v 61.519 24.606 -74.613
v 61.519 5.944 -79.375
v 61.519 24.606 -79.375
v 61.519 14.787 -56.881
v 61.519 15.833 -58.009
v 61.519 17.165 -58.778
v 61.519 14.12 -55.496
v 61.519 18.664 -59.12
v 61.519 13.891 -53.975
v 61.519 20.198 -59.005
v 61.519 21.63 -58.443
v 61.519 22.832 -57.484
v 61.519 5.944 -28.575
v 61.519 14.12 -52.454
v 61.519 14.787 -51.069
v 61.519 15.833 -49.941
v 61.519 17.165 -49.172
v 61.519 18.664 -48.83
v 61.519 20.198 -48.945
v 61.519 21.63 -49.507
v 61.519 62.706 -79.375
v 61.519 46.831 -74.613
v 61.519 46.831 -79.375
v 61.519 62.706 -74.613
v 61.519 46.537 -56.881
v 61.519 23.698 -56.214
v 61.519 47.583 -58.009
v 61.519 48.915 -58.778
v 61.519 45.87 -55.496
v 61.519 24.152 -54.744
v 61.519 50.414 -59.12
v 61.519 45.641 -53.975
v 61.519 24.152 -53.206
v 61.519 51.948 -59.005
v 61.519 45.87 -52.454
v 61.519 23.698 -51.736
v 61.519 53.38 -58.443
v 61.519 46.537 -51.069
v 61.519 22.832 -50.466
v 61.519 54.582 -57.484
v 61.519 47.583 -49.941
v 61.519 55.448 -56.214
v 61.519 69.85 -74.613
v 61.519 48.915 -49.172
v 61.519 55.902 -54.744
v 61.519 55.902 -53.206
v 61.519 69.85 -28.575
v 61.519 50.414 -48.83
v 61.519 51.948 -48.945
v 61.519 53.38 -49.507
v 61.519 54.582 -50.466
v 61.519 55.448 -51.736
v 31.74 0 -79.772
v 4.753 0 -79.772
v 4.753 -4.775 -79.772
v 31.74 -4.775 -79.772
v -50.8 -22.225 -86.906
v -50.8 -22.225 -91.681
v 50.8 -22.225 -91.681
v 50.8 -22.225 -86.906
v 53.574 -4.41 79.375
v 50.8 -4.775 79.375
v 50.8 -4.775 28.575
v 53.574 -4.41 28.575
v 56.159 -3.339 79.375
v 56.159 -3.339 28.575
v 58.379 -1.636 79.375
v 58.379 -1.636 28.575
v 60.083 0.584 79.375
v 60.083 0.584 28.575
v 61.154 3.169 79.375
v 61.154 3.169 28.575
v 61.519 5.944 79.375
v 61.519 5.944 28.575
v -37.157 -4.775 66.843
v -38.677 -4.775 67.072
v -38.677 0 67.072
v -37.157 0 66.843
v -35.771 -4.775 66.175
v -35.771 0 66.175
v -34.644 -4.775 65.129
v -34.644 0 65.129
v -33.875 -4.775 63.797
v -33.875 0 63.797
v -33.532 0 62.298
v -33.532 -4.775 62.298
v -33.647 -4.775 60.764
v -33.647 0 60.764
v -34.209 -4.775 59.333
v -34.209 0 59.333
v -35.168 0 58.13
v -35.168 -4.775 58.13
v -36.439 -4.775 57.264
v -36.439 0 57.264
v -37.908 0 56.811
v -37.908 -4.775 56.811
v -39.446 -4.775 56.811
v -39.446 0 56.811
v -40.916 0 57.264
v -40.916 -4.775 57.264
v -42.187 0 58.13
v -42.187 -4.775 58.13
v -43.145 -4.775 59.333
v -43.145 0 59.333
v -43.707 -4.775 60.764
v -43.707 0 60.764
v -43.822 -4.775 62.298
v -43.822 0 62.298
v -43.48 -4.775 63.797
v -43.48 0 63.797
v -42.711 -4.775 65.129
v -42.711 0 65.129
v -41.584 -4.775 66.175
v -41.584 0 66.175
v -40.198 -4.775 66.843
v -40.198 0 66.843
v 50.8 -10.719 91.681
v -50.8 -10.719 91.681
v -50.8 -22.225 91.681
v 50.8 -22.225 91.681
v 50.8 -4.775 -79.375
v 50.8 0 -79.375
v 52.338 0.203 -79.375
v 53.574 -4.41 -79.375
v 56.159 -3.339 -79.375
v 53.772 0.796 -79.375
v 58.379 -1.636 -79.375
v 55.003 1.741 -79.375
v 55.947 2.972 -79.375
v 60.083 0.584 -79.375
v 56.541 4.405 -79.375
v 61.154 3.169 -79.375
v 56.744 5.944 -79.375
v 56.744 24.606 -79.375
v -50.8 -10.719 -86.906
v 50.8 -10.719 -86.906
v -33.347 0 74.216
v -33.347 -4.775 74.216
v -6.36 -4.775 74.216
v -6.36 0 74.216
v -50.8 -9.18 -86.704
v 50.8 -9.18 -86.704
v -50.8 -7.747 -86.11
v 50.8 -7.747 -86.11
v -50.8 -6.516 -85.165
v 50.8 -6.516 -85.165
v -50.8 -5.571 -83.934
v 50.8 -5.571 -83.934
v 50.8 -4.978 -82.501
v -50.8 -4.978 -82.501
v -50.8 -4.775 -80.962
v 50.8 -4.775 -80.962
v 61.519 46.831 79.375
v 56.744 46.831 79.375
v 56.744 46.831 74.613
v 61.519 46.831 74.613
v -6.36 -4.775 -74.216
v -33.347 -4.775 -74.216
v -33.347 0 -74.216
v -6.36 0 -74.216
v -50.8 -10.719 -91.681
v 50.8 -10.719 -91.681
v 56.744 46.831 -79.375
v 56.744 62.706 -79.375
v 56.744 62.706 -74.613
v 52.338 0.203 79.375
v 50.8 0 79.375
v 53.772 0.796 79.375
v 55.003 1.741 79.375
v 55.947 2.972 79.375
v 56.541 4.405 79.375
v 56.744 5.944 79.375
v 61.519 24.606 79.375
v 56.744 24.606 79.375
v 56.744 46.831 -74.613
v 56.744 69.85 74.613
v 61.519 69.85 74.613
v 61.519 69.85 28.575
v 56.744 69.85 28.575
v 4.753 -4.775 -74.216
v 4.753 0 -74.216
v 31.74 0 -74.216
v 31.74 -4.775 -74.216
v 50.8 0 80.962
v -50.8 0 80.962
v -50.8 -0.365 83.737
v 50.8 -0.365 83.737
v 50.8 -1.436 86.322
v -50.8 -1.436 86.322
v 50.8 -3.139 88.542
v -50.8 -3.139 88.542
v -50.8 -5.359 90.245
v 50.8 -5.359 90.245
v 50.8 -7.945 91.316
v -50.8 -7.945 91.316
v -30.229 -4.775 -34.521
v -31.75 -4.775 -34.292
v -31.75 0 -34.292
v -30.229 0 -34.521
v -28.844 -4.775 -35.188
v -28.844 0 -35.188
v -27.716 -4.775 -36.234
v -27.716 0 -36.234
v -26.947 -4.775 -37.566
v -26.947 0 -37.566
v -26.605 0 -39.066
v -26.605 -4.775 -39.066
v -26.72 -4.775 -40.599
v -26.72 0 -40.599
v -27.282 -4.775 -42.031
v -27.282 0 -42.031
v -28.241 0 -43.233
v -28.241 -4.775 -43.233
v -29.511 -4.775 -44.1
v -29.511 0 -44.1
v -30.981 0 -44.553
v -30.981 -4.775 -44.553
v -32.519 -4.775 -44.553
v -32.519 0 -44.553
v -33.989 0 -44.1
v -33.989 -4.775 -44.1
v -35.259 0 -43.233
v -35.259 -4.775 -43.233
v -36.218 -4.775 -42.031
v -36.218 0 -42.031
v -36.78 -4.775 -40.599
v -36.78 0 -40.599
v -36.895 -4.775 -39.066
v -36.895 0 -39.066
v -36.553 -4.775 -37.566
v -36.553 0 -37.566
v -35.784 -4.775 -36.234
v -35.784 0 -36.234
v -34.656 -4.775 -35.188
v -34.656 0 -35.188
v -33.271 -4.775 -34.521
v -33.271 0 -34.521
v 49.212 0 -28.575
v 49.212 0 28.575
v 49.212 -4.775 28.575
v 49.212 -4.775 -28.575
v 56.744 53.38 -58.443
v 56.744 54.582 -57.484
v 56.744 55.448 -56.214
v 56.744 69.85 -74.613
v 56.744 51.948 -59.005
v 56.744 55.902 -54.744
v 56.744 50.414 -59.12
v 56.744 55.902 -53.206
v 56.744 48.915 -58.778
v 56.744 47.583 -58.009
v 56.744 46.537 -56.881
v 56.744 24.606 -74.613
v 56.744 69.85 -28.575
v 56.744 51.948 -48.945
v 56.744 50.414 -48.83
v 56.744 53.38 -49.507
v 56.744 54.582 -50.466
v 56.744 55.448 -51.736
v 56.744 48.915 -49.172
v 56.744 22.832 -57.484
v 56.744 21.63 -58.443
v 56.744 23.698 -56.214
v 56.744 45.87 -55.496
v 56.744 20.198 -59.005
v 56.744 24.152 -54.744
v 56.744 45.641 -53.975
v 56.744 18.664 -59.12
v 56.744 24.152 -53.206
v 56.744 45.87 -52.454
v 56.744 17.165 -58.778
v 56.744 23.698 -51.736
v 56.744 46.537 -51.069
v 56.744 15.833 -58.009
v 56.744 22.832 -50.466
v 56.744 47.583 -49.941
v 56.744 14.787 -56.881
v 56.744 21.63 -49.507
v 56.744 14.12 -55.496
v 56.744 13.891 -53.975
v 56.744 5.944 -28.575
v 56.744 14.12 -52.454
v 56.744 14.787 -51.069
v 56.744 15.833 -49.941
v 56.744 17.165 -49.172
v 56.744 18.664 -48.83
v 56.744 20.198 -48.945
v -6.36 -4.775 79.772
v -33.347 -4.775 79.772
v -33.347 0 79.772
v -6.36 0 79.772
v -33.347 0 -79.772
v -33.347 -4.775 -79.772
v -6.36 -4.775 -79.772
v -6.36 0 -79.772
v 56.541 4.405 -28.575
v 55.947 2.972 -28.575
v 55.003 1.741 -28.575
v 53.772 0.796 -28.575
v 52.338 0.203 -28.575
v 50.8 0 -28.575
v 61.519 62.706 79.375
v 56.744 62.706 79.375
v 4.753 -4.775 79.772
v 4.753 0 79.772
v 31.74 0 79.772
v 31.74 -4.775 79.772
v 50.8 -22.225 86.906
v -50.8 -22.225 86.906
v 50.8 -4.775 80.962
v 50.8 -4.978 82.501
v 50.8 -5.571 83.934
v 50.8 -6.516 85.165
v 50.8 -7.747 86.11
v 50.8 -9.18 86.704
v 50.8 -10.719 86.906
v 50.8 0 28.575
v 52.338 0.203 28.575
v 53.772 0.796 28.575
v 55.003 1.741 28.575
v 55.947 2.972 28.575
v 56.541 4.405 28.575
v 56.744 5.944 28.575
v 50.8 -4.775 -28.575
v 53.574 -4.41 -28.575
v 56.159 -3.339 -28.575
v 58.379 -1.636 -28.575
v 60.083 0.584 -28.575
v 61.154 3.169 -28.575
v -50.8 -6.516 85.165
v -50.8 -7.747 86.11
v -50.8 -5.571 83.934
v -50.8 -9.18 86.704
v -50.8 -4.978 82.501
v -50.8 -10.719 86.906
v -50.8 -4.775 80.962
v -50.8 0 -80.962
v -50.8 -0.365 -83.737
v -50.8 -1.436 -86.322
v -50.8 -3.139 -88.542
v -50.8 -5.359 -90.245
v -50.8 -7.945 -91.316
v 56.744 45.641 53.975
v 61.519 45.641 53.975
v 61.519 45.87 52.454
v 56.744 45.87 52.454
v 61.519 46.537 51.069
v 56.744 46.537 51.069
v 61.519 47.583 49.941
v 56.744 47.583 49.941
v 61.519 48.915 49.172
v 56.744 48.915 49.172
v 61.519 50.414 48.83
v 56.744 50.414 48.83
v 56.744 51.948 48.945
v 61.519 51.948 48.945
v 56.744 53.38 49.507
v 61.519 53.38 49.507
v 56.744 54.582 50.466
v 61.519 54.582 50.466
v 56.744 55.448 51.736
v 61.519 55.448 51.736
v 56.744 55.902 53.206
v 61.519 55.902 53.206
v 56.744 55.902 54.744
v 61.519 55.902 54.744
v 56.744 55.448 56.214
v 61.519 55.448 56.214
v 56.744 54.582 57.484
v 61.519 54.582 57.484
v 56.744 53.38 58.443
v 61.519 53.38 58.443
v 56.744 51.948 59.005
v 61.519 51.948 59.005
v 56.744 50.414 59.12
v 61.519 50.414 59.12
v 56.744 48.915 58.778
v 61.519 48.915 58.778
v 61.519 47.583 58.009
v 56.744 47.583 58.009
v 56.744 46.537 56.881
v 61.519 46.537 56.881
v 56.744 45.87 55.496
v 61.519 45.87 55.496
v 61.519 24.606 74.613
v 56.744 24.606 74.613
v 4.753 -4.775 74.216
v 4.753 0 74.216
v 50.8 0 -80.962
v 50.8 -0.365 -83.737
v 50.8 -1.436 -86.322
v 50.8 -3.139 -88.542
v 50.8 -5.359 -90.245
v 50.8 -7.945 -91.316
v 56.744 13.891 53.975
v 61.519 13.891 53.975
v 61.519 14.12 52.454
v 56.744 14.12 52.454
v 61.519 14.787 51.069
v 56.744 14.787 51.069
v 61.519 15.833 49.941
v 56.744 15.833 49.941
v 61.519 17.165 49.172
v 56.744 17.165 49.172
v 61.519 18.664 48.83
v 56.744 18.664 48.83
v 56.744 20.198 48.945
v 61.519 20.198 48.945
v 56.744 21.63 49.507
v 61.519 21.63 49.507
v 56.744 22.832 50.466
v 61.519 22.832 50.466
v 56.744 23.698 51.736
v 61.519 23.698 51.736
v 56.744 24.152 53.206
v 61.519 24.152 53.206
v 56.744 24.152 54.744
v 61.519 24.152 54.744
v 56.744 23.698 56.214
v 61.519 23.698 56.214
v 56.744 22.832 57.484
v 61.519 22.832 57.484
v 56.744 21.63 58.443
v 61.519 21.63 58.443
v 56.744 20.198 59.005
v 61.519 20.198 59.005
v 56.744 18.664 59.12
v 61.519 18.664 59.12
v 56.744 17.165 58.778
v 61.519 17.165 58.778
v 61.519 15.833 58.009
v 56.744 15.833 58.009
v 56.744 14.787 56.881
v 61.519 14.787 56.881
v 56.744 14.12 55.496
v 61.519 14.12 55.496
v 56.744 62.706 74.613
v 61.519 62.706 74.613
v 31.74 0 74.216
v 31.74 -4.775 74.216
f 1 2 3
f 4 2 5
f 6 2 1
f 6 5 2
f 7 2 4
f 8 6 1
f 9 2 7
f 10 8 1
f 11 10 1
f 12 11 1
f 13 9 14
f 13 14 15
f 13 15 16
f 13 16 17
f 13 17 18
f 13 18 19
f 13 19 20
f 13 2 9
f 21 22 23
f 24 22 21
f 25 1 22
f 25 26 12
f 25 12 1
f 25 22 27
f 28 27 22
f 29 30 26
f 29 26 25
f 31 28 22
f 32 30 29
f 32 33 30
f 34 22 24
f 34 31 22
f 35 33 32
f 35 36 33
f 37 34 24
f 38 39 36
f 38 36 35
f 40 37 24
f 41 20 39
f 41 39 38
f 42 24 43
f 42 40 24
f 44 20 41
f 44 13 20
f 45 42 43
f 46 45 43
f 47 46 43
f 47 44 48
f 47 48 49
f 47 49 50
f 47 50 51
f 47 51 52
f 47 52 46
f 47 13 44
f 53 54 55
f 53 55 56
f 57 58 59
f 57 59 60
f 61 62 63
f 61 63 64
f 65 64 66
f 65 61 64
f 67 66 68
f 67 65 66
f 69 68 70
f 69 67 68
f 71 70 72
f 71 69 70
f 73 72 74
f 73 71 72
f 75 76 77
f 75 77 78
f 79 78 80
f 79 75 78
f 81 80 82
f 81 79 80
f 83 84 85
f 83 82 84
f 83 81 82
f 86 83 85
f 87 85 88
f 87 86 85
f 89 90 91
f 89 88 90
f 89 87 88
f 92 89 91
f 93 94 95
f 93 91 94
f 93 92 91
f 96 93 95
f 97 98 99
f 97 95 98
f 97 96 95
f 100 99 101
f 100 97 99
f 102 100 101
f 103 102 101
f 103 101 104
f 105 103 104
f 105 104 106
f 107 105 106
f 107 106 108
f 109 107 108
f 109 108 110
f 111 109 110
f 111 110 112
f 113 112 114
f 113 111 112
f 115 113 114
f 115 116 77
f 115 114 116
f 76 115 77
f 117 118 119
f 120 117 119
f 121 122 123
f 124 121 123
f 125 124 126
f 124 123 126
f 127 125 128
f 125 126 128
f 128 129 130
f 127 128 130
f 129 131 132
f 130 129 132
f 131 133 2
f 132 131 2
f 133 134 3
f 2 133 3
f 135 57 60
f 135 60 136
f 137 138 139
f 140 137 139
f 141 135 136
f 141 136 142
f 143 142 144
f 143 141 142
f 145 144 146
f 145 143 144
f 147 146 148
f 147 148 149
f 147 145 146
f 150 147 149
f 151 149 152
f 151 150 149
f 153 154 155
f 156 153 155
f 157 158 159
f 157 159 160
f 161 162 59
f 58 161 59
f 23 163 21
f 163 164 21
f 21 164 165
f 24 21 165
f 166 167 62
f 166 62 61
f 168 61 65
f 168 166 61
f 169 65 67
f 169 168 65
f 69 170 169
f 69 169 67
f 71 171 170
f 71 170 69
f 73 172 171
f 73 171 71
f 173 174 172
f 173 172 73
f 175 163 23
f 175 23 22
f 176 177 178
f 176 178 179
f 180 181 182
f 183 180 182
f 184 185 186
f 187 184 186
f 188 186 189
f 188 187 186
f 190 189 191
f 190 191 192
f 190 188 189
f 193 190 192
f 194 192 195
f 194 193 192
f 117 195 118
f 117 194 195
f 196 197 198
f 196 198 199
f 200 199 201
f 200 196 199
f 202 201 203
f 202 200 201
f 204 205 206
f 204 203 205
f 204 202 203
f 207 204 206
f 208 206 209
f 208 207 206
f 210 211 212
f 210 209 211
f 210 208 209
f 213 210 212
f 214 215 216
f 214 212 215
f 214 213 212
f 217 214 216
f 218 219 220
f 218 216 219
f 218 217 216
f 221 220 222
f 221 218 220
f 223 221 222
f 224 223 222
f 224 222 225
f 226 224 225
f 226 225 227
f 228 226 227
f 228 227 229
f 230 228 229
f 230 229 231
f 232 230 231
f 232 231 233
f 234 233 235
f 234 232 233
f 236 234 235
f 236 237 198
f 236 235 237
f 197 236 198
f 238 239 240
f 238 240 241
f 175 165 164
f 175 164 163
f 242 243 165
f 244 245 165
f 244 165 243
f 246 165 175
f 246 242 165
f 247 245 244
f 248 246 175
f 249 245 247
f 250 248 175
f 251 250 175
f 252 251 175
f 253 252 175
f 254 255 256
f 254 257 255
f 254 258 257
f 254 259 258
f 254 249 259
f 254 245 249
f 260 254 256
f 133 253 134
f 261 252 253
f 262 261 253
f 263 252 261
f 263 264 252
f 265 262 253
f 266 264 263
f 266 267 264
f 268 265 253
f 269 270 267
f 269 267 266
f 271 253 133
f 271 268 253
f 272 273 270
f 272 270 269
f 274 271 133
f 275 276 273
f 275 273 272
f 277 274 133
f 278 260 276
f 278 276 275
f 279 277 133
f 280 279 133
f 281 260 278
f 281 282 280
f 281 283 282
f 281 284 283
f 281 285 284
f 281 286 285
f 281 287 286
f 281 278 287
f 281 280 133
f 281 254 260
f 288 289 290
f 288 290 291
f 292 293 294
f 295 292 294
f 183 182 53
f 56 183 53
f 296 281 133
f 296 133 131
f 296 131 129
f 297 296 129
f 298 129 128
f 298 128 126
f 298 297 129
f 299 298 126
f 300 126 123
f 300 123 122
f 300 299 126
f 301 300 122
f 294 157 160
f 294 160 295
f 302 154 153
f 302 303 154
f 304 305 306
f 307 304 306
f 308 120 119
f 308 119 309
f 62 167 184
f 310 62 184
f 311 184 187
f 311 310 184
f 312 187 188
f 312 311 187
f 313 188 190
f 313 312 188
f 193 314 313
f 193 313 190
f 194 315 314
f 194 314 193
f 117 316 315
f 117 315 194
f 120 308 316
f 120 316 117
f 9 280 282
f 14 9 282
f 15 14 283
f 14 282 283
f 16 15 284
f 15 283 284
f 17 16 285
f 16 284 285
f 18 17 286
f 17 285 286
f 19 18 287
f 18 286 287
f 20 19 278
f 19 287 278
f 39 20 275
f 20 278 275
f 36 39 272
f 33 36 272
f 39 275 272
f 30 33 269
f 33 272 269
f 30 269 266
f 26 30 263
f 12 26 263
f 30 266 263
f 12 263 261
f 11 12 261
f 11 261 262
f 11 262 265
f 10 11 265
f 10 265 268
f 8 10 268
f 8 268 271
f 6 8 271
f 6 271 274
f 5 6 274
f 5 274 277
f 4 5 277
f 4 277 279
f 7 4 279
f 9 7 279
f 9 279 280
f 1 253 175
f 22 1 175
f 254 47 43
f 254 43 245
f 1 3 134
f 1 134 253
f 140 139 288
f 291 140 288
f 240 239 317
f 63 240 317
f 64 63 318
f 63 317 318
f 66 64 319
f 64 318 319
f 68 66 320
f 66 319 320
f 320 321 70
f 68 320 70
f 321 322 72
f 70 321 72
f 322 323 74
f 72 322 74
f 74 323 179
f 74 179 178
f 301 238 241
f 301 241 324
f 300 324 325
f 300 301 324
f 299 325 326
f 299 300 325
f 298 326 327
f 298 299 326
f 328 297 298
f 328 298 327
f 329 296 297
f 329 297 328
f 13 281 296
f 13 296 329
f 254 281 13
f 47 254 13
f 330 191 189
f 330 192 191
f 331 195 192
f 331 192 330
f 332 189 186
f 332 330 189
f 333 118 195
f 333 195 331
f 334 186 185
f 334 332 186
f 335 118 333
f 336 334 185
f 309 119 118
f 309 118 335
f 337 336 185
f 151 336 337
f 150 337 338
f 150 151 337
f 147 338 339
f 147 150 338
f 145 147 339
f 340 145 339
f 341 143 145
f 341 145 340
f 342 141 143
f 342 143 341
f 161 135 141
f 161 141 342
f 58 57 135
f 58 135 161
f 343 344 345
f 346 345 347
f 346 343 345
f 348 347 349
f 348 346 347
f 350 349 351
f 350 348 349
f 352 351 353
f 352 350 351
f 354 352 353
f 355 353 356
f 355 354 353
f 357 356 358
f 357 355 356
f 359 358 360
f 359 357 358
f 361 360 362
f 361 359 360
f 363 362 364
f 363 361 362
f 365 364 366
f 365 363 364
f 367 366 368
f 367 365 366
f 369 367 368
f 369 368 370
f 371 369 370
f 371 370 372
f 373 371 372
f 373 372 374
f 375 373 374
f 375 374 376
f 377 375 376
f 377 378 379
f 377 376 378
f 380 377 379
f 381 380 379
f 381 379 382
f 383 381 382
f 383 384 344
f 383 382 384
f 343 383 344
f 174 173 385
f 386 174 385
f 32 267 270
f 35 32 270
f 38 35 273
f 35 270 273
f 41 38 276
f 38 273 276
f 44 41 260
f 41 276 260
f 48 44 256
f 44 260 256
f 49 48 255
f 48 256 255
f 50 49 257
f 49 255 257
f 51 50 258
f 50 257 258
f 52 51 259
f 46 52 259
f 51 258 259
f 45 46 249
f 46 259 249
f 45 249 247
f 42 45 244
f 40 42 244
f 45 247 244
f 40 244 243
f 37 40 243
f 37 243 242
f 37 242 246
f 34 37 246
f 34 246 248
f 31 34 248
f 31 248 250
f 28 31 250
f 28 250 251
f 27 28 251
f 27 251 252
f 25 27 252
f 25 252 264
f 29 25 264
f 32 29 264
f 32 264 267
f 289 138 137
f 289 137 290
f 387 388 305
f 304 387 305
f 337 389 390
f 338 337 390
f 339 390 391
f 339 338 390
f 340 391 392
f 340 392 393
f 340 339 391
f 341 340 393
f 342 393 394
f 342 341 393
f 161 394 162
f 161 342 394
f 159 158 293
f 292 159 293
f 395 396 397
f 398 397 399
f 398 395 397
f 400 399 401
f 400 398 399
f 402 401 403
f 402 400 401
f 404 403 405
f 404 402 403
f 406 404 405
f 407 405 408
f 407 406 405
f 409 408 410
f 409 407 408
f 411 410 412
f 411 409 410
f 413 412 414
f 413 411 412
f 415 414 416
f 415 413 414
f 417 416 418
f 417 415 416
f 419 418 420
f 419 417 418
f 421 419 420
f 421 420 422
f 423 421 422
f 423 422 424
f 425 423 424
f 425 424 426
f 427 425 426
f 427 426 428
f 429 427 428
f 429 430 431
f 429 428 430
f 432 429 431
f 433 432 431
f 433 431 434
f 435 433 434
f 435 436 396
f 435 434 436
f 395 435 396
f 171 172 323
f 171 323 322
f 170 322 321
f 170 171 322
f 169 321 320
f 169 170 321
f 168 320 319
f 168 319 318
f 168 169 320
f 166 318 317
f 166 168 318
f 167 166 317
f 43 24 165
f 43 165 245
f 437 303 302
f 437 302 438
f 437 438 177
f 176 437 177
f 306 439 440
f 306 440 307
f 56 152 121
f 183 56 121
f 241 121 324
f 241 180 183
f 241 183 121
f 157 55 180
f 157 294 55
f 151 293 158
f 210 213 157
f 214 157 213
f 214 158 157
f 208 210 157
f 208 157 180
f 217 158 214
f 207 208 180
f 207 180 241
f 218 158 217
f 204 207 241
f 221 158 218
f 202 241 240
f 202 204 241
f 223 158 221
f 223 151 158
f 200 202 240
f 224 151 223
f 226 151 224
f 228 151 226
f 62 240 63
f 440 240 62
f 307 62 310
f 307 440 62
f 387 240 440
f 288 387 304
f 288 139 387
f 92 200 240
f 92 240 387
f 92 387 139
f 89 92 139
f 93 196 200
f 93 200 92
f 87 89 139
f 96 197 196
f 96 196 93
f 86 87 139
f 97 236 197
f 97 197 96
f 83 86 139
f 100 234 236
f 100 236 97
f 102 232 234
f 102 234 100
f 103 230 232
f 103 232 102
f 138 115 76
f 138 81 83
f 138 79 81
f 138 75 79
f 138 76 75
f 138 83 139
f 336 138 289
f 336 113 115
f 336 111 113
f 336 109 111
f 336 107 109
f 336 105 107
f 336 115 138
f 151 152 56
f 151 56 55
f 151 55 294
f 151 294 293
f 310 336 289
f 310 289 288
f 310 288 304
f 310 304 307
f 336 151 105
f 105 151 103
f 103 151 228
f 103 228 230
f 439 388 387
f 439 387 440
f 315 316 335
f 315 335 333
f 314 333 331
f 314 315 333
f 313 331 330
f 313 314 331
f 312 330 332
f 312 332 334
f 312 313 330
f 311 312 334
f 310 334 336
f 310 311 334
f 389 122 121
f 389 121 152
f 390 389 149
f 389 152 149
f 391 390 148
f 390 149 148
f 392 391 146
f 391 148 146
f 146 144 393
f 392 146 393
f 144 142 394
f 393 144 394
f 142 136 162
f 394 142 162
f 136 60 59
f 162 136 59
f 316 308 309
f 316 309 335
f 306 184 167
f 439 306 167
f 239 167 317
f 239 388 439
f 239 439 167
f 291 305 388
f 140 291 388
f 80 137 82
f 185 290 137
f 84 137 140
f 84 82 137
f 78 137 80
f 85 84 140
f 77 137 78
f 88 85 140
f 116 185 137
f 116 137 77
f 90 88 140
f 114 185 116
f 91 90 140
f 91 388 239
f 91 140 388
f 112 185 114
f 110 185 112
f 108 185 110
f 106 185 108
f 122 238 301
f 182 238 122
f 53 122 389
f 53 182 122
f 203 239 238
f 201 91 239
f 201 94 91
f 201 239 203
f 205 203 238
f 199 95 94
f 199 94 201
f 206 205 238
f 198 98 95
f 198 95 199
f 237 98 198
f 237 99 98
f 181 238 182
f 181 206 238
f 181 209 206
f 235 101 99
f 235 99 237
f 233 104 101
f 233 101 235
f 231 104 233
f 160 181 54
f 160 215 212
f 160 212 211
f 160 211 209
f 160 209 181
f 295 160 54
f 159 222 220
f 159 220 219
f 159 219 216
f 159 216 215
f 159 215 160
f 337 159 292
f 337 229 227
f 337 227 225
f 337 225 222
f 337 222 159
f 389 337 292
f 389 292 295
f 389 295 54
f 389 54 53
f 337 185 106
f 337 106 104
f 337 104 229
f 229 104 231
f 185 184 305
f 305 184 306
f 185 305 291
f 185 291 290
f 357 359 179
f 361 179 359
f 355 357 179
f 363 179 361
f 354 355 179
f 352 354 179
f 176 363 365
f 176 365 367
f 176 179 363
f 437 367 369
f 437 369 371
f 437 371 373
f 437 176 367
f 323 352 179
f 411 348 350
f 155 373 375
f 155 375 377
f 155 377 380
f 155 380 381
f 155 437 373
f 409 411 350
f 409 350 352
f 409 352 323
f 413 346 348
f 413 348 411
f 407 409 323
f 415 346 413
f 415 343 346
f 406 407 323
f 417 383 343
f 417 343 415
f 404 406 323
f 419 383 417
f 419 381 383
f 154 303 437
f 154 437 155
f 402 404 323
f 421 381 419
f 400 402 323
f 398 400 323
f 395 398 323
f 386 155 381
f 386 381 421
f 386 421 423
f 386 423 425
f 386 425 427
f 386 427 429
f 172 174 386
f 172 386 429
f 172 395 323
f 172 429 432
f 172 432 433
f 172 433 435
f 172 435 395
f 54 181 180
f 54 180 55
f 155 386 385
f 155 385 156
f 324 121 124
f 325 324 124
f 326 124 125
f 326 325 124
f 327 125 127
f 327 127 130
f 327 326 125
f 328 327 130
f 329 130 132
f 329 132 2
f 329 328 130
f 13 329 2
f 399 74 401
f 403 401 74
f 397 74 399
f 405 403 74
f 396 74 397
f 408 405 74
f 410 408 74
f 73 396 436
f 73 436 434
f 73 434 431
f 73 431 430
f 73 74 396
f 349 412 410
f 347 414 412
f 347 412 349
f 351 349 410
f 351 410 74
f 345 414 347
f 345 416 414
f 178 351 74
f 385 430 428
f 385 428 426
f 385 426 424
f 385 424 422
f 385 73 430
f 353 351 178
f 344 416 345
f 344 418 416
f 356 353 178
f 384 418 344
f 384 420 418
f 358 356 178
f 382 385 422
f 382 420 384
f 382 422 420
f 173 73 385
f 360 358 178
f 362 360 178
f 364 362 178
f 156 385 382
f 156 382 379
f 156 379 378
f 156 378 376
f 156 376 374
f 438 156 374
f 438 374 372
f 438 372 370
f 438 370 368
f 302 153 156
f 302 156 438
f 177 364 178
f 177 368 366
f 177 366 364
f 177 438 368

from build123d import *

# Parameters (mm, degrees)
BASE_FLANGE1_DEPTH      = 4.7752
EDGE_FLANGE1_DEPTH      = 50.8
EDGE_FLANGE1_BEND_DEPTH = 50.8
EDGE_FLANGE2_DEPTH      = 101.6
EDGE_FLANGE2_BEND_DEPTH = 101.6
SKETCH18_R              = 5.159375
SKETCH18_W              = 4.7625
SKETCH18_H              = 22.225
CUT_EXTRUDE1_DEPTH      = 158.639173972
SKETCH19_W              = 26.9875
SKETCH19_H              = 5.55625
CUT_EXTRUDE2_DEPTH      = 131.648559208
CUT_EXTRUDE3_DEPTH      = 131.648559208
CUT_EXTRUDE3_DEPTH_BACK = 131.648559208
SKETCH20_R              = 5.159375


# Sheet-metal steps are written as plain solids
with BuildPart() as part:
    # Sketch1 → Base-Flange1 (new body)
    with BuildSketch(Plane(origin=(0, 0, 0), x_dir=(1, 0, 0), z_dir=(0, 1, 0))):
        Polygon((49.2125, -28.575), (49.2125, 28.575), (50.8, 28.575), (50.8, 79.375), (-50.8, 79.375), (-50.8, -79.375), (50.8, -79.375), (50.8, -28.575), align=None)
    extrude(amount=-BASE_FLANGE1_DEPTH)

    # Edge-Flange1 section (across the edge) → Edge-Flange1 (add)
    with BuildSketch(Plane(origin=(56.7436, 0, -28.575), x_dir=(-1, 0, 0), z_dir=(0, 0, -1))):
        with BuildLine():
            Line((-4.7752, 5.9436), (-4.7752, 69.85))
            Line((-4.7752, 69.85), (0, 69.85))
            Line((0, 69.85), (0, 5.9436))
            ThreePointArc((0, 5.9436), (1.740840135, 1.740840135), (5.9436, 0))
            Line((5.9436, 0), (5.9436, -4.7752))
            ThreePointArc((5.9436, -4.7752), (-1.635736166, -1.635736166), (-4.7752, 5.9436))
        make_face()
    extrude(amount=EDGE_FLANGE1_DEPTH)

    # Edge-Flange1 section 2 (across the edge) → Edge-Flange1 bend (add)
    with BuildSketch(Plane(origin=(56.7436, 0, 79.375), x_dir=(-1, 0, 0), z_dir=(0, 0, -1))):
        with BuildLine():
            Line((-4.7752, 5.9436), (-4.7752, 69.85))
            Line((-4.7752, 69.85), (0, 69.85))
            Line((0, 69.85), (0, 5.9436))
            ThreePointArc((0, 5.9436), (1.740840135, 1.740840135), (5.9436, 0))
            Line((5.9436, 0), (5.9436, -4.7752))
            ThreePointArc((5.9436, -4.7752), (-1.635736166, -1.635736166), (-4.7752, 5.9436))
        make_face()
    extrude(amount=EDGE_FLANGE1_BEND_DEPTH)

    # Edge-Flange2 section (across the edge) → Edge-Flange2 (add)
    with BuildSketch(Plane(origin=(50.8, -4.7752, 86.9061), x_dir=(0, 0, -1), z_dir=(-1, 0, 0))):
        with BuildLine():
            Line((-4.7752, 5.9436), (-4.7752, 17.4498))
            Line((-4.7752, 17.4498), (0, 17.4498))
            Line((0, 17.4498), (0, 5.9436))
            ThreePointArc((0, 5.9436), (1.740840135, 1.740840135), (5.9436, 0))
            Line((5.9436, 0), (7.5311, 0))
            Line((7.5311, 0), (7.5311, -4.7752))
            Line((7.5311, -4.7752), (5.9436, -4.7752))
            ThreePointArc((5.9436, -4.7752), (-1.635736166, -1.635736166), (-4.7752, 5.9436))
        make_face()
    extrude(amount=EDGE_FLANGE2_DEPTH)

    # Edge-Flange2 section 2 (across the edge) → Edge-Flange2 bend (add)
    with BuildSketch(Plane(origin=(-50.8, -4.7752, -86.9061), x_dir=(0, 0, 1), z_dir=(1, 0, 0))):
        with BuildLine():
            Line((-4.7752, 5.9436), (-4.7752, 17.4498))
            Line((-4.7752, 17.4498), (0, 17.4498))
            Line((0, 17.4498), (0, 5.9436))
            ThreePointArc((0, 5.9436), (1.740840135, 1.740840135), (5.9436, 0))
            Line((5.9436, 0), (7.5311, 0))
            Line((7.5311, 0), (7.5311, -4.7752))
            Line((7.5311, -4.7752), (5.9436, -4.7752))
            ThreePointArc((5.9436, -4.7752), (-1.635736166, -1.635736166), (-4.7752, 5.9436))
        make_face()
    extrude(amount=EDGE_FLANGE2_BEND_DEPTH)

    # Sketch18 → Cut-Extrude1 (cut, symmetric)
    with BuildSketch(Plane.ZY.offset(-56.7436)):
        with Locations(Location((-53.975, 50.8, 0), (0, 0, 270))):
            Circle(SKETCH18_R)
        with Locations(Location((-53.975, 19.05, 0), (0, 0, 270))):
            Circle(SKETCH18_R)
        with Locations((-76.99375, 73.81875)):
            Rectangle(SKETCH18_W, SKETCH18_H)
        with Locations((-76.99375, 35.71875)):
            Rectangle(SKETCH18_W, SKETCH18_H)
    cut_extrude1 = extrude(amount=CUT_EXTRUDE1_DEPTH, both=True, mode=Mode.SUBTRACT)

    # Sketch19 → Cut-Extrude2 (cut, symmetric)
    with BuildSketch(Plane(origin=(0, 0, 0), x_dir=(1, 0, 0), z_dir=(0, 1, 0))):
        with Locations((-19.853275, 76.99375)):
            Rectangle(SKETCH19_W, SKETCH19_H)
        with Locations((18.246725, 76.99375)):
            Rectangle(SKETCH19_W, SKETCH19_H)
    cut_extrude2 = extrude(amount=CUT_EXTRUDE2_DEPTH, both=True, mode=Mode.SUBTRACT)

    # Sketch20 → Cut-Extrude3 (cut, two sides: drawn at the far end of the back side and taken through both)
    with BuildSketch(Plane(origin=(0, 0, 0), x_dir=(1, 0, 0), z_dir=(0, 1, 0)).offset(-CUT_EXTRUDE3_DEPTH_BACK)):
        with Locations((-101.437452915, 44.213567876)):
            Circle(SKETCH20_R)
        with Locations(Location((-31.75, 39.451067876, 0), (0, 0, 270))):
            Circle(SKETCH20_R)
        with Locations(Location((-38.677272727, -61.9125, 0), (0, 0, 270))):
            Circle(SKETCH20_R)
        with Locations((-108.364725642, -57.15)):
            Circle(SKETCH20_R)
    extrude(amount=CUT_EXTRUDE3_DEPTH + CUT_EXTRUDE3_DEPTH_BACK, mode=Mode.SUBTRACT)

    # Mirror1: Cut-Extrude1, Cut-Extrude2 across plane
    add(cut_extrude1.mirror(Plane.XY), mode=Mode.SUBTRACT)
    add(cut_extrude2.mirror(Plane.XY), mode=Mode.SUBTRACT)


solid = part.part
